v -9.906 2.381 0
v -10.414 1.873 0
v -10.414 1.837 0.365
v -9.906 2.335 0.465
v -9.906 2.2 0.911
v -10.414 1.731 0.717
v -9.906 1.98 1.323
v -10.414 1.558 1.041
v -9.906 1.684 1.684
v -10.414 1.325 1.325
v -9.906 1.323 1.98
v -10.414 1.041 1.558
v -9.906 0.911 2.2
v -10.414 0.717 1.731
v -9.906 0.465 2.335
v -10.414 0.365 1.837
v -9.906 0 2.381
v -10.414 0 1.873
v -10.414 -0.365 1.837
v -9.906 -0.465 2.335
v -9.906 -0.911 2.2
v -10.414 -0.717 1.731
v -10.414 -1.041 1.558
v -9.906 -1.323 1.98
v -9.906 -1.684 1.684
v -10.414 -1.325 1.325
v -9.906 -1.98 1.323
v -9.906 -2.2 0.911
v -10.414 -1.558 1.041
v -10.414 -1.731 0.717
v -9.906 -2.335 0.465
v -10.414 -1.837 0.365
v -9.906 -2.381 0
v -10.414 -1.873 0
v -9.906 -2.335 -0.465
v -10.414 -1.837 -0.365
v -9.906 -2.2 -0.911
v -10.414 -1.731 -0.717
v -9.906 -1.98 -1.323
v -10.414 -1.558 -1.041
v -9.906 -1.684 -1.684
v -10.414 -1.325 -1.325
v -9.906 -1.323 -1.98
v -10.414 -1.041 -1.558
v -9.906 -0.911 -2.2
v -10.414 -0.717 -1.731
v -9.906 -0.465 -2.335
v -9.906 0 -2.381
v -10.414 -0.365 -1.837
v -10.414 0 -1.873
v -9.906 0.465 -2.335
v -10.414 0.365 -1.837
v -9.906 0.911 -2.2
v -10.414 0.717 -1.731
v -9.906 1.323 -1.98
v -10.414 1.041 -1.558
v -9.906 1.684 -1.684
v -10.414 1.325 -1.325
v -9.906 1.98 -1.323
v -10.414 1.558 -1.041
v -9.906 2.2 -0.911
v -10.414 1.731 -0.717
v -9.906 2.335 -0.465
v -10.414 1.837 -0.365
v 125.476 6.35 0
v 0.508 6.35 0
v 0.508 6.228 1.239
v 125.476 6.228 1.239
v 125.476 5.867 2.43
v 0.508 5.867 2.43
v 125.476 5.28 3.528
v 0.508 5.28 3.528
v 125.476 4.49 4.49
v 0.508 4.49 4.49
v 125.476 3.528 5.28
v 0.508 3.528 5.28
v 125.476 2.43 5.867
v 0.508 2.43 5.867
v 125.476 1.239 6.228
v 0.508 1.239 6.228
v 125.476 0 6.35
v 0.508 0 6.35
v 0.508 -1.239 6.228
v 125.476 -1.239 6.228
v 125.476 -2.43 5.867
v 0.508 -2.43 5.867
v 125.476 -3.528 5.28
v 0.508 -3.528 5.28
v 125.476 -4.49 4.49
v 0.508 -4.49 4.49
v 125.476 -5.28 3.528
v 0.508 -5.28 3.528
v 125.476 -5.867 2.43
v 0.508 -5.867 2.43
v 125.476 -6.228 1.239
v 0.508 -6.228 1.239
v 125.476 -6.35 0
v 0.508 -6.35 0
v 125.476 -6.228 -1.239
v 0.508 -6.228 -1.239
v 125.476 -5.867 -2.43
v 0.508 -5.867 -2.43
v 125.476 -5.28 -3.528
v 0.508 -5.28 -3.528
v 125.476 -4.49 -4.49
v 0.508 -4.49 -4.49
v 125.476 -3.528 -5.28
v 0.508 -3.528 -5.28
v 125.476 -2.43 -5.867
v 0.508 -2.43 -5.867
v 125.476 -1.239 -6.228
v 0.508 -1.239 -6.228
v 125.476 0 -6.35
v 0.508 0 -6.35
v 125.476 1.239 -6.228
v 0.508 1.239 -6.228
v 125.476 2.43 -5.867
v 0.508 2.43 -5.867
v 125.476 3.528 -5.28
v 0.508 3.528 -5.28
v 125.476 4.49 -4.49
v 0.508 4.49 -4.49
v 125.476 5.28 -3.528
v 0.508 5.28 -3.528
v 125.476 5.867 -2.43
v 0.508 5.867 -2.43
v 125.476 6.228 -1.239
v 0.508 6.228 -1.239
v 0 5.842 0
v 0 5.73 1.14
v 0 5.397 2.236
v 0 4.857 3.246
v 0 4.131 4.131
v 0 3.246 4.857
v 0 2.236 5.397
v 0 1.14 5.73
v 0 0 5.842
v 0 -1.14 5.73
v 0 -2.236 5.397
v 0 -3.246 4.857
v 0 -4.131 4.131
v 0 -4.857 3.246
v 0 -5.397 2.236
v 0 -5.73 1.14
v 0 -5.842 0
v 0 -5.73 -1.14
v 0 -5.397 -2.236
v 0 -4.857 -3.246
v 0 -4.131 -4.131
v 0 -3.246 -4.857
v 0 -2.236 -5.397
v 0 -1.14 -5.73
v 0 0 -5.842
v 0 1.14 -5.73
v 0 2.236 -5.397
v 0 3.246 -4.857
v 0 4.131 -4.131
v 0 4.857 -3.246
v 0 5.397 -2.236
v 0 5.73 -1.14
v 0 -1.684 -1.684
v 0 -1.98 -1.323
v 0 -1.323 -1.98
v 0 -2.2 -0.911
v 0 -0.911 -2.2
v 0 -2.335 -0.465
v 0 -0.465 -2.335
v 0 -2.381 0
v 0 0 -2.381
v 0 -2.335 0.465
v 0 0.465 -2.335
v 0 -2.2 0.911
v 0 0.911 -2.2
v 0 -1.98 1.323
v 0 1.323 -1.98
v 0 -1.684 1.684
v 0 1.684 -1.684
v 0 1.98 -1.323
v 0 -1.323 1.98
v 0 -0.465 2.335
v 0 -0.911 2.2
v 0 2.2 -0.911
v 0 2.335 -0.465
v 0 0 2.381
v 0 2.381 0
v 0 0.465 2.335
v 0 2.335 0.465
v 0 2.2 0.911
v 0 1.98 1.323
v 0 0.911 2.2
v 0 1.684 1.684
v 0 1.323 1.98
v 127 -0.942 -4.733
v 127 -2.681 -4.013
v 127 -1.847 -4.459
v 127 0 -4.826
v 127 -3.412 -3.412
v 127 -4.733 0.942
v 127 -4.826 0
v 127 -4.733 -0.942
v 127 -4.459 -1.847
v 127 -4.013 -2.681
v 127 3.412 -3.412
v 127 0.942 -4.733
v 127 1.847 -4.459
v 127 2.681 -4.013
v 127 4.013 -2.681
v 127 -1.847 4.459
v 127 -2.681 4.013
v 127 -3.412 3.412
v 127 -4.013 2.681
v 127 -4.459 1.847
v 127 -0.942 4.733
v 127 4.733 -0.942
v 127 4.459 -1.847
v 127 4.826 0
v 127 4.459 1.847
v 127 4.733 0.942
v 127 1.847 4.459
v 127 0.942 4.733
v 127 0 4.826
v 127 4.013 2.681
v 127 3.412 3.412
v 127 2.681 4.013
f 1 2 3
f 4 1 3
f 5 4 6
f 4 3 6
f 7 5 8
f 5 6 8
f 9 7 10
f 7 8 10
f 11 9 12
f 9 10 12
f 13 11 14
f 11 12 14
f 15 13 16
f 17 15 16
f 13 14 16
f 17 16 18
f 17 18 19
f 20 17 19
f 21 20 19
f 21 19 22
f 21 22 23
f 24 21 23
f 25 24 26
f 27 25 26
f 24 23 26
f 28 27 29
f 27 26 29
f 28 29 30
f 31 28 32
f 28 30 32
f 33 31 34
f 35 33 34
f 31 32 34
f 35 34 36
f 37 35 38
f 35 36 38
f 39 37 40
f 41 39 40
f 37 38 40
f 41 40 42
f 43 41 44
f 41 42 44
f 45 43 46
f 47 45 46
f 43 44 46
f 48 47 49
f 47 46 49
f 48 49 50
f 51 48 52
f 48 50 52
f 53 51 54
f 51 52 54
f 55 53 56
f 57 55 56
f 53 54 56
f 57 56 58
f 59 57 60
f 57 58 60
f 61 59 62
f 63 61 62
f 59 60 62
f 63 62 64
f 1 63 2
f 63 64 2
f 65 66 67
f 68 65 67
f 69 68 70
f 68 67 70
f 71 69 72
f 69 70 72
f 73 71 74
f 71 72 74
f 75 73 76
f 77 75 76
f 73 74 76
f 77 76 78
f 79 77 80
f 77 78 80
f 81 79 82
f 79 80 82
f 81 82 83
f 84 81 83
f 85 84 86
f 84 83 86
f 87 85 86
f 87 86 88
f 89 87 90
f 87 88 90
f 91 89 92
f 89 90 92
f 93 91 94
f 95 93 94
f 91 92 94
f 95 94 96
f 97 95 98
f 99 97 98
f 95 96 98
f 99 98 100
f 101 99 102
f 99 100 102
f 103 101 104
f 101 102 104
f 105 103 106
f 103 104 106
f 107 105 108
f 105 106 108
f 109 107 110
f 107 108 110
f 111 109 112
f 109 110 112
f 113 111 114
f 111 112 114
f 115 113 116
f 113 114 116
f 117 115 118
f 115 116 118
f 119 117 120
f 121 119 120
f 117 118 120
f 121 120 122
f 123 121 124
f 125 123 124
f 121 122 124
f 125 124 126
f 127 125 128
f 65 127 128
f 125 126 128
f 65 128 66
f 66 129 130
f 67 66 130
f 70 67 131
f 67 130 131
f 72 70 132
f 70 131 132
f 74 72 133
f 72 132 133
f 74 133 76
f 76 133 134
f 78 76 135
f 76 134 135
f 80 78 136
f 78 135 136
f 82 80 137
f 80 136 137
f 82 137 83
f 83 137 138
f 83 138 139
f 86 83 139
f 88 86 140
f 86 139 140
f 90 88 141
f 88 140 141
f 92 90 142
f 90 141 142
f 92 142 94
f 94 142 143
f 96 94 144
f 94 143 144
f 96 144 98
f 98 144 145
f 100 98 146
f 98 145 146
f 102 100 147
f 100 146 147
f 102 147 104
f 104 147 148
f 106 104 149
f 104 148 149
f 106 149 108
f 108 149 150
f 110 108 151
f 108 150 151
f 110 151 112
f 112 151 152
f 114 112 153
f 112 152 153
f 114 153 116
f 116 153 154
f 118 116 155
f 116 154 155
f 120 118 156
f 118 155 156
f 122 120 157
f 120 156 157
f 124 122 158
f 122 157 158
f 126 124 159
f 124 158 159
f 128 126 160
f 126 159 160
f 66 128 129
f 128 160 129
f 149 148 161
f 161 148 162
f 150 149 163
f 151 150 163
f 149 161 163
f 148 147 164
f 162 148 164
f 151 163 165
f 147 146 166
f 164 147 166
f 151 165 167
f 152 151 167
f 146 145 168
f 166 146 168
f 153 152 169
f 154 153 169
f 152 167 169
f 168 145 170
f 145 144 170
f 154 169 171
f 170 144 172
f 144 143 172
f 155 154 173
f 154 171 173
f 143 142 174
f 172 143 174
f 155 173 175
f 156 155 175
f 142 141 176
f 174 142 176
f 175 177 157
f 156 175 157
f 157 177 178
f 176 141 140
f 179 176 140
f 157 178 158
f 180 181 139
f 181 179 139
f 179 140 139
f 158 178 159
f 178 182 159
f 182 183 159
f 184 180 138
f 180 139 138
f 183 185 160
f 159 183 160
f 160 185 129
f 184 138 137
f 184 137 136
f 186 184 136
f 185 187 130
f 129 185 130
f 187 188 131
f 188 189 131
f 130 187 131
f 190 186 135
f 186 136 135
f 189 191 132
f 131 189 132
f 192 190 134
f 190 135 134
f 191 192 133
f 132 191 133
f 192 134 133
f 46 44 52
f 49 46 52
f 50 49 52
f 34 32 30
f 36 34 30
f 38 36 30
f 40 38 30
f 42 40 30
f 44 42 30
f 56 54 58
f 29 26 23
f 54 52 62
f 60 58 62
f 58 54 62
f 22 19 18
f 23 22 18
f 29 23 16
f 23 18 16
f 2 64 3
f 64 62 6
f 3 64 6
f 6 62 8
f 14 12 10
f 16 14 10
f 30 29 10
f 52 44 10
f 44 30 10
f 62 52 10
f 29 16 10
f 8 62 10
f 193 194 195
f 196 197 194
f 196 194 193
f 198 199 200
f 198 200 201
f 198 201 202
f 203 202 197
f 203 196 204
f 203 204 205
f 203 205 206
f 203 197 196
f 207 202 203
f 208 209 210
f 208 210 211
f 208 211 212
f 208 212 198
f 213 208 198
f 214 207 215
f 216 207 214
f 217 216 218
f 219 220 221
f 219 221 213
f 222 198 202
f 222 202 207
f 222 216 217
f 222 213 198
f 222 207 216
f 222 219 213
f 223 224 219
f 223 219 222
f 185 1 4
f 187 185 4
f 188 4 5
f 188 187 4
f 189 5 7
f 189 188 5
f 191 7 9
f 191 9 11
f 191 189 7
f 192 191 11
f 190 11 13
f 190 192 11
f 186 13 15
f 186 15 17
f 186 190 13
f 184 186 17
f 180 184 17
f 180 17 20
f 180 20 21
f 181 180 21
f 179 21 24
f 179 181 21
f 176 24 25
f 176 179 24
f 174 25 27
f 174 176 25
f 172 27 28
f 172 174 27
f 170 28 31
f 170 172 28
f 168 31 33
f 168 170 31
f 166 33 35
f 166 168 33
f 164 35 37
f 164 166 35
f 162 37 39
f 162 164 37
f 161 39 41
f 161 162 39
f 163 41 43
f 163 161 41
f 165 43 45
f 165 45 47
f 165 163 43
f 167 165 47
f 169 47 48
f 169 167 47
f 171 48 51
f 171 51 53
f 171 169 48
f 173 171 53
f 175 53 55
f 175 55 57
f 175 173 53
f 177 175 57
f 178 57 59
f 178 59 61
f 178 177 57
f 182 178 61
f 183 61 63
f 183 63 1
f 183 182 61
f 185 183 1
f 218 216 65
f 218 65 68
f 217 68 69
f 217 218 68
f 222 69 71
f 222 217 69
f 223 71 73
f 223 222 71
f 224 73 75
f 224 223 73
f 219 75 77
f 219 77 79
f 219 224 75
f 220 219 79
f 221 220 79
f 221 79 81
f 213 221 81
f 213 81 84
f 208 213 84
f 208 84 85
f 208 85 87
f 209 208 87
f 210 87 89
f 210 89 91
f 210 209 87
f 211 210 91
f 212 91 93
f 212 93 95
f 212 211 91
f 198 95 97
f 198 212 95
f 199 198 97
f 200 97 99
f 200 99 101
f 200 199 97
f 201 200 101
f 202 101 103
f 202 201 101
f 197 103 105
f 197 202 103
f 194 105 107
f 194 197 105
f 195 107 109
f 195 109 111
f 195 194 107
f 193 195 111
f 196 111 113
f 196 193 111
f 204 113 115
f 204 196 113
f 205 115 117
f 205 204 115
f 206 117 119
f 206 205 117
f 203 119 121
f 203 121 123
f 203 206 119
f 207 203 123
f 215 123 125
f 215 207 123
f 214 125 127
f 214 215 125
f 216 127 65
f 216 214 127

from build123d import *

# Parameters (mm, degrees)
F0_R     = 6.35
F1_DEPTH = 127
F2_SIZE2 = 1.524
F2_SIZE  = 1.524
F3_R     = 2.38125
F4_DEPTH = 10.414
F5_SIZE2 = 0.508
F5_SIZE  = 0.508


with BuildPart() as f1:
    # F0 (on Right) → F1 (new body)
    with BuildSketch(Plane.YZ):
        Circle(F0_R)
    extrude(amount=F1_DEPTH)

    # F2
    f2_edges = [f1.edges().sort_by_distance(p)[0] for p in [
        (127, -6.35, 0),
    ]]
    chamfer(f2_edges, length=F2_SIZE, length2=F2_SIZE2)

    # F3 (on Right) → F4 (join)
    with BuildSketch(Plane.YZ):
        Circle(F3_R)
    extrude(amount=-F4_DEPTH)

    # F5
    f5_edges = [f1.edges().sort_by_distance(p)[0] for p in [
        (0, -6.35, 0),
        (-10.414, -2.38125, 0),
    ]]
    chamfer(f5_edges, length=F5_SIZE, length2=F5_SIZE2)


solid = f1.part
